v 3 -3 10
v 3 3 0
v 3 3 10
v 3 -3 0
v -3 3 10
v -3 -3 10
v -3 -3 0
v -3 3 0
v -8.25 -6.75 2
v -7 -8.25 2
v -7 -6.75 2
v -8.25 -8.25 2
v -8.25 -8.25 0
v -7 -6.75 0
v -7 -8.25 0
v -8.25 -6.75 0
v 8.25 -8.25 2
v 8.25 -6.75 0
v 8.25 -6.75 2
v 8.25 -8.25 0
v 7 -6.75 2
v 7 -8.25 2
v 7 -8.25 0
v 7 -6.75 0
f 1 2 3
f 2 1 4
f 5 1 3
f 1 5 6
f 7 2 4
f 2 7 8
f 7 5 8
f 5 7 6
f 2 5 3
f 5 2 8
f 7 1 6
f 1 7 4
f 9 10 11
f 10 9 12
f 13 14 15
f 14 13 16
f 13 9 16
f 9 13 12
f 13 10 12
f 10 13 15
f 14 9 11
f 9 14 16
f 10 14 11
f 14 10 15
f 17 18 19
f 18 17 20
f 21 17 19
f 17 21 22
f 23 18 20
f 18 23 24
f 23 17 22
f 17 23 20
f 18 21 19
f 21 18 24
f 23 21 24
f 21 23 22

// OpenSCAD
translate([0, 0, 5]) color([0,1,0,0.9]) cube([6, 6, 10], center=true);
translate([-8.0, -8.0, 1]) color([1,0,0]) cube([0.5, 0.5, 2], center=true);
translate([-8.0, -7.75, 1]) color([1,0,0]) cube([0.5, 0.5, 2], center=true);
translate([-8.0, -7.5, 1]) color([1,0,0]) cube([0.5, 0.5, 2], center=true);
translate([-8.0, -7.25, 1]) color([1,0,0]) cube([0.5, 0.5, 2], center=true);
translate([-8.0, -7.0, 1]) color([1,0,0]) cube([0.5, 0.5, 2], center=true);
translate([-7.75, -8.0, 1]) color([1,0,0]) cube([0.5, 0.5, 2], center=true);
translate([-7.75, -7.75, 1]) color([1,0,0]) cube([0.5, 0.5, 2], center=true);
translate([-7.75, -7.5, 1]) color([1,0,0]) cube([0.5, 0.5, 2], center=true);
translate([-7.75, -7.25, 1]) color([1,0,0]) cube([0.5, 0.5, 2], center=true);
translate([-7.75, -7.0, 1]) color([1,0,0]) cube([0.5, 0.5, 2], center=true);
translate([-7.5, -8.0, 1]) color([1,0,0]) cube([0.5, 0.5, 2], center=true);
translate([-7.5, -7.75, 1]) color([1,0,0]) cube([0.5, 0.5, 2], center=true);
translate([-7.5, -7.5, 1]) color([1,0,0]) cube([0.5, 0.5, 2], center=true);
translate([-7.5, -7.25, 1]) color([1,0,0]) cube([0.5, 0.5, 2], center=true);
translate([-7.5, -7.0, 1]) color([1,0,0]) cube([0.5, 0.5, 2], center=true);
translate([-7.25, -8.0, 1]) color([1,0,0]) cube([0.5, 0.5, 2], center=true);
translate([-7.25, -7.75, 1]) color([1,0,0]) cube([0.5, 0.5, 2], center=true);
translate([-7.25, -7.5, 1]) color([1,0,0]) cube([0.5, 0.5, 2], center=true);
translate([-7.25, -7.25, 1]) color([1,0,0]) cube([0.5, 0.5, 2], center=true);
translate([-7.25, -7.0, 1]) color([1,0,0]) cube([0.5, 0.5, 2], center=true);
translate([8.0, -8.0, 1]) color([1,0,0]) cube([0.5, 0.5, 2], center=true);
translate([8.0, -7.75, 1]) color([1,0,0]) cube([0.5, 0.5, 2], center=true);
translate([8.0, -7.5, 1]) color([1,0,0]) cube([0.5, 0.5, 2], center=true);
translate([8.0, -7.25, 1]) color([1,0,0]) cube([0.5, 0.5, 2], center=true);
translate([8.0, -7.0, 1]) color([1,0,0]) cube([0.5, 0.5, 2], center=true);
translate([7.75, -8.0, 1]) color([1,0,0]) cube([0.5, 0.5, 2], center=true);
translate([7.75, -7.75, 1]) color([1,0,0]) cube([0.5, 0.5, 2], center=true);
translate([7.75, -7.5, 1]) color([1,0,0]) cube([0.5, 0.5, 2], center=true);
translate([7.75, -7.25, 1]) color([1,0,0]) cube([0.5, 0.5, 2], center=true);
translate([7.75, -7.0, 1]) color([1,0,0]) cube([0.5, 0.5, 2], center=true);
translate([7.5, -8.0, 1]) color([1,0,0]) cube([0.5, 0.5, 2], center=true);
translate([7.5, -7.75, 1]) color([1,0,0]) cube([0.5, 0.5, 2], center=true);
translate([7.5, -7.5, 1]) color([1,0,0]) cube([0.5, 0.5, 2], center=true);
translate([7.5, -7.25, 1]) color([1,0,0]) cube([0.5, 0.5, 2], center=true);
translate([7.5, -7.0, 1]) color([1,0,0]) cube([0.5, 0.5, 2], center=true);
translate([7.25, -8.0, 1]) color([1,0,0]) cube([0.5, 0.5, 2], center=true);
translate([7.25, -7.75, 1]) color([1,0,0]) cube([0.5, 0.5, 2], center=true);
translate([7.25, -7.5, 1]) color([1,0,0]) cube([0.5, 0.5, 2], center=true);
translate([7.25, -7.25, 1]) color([1,0,0]) cube([0.5, 0.5, 2], center=true);
translate([7.25, -7.0, 1]) color([1,0,0]) cube([0.5, 0.5, 2], center=true);
